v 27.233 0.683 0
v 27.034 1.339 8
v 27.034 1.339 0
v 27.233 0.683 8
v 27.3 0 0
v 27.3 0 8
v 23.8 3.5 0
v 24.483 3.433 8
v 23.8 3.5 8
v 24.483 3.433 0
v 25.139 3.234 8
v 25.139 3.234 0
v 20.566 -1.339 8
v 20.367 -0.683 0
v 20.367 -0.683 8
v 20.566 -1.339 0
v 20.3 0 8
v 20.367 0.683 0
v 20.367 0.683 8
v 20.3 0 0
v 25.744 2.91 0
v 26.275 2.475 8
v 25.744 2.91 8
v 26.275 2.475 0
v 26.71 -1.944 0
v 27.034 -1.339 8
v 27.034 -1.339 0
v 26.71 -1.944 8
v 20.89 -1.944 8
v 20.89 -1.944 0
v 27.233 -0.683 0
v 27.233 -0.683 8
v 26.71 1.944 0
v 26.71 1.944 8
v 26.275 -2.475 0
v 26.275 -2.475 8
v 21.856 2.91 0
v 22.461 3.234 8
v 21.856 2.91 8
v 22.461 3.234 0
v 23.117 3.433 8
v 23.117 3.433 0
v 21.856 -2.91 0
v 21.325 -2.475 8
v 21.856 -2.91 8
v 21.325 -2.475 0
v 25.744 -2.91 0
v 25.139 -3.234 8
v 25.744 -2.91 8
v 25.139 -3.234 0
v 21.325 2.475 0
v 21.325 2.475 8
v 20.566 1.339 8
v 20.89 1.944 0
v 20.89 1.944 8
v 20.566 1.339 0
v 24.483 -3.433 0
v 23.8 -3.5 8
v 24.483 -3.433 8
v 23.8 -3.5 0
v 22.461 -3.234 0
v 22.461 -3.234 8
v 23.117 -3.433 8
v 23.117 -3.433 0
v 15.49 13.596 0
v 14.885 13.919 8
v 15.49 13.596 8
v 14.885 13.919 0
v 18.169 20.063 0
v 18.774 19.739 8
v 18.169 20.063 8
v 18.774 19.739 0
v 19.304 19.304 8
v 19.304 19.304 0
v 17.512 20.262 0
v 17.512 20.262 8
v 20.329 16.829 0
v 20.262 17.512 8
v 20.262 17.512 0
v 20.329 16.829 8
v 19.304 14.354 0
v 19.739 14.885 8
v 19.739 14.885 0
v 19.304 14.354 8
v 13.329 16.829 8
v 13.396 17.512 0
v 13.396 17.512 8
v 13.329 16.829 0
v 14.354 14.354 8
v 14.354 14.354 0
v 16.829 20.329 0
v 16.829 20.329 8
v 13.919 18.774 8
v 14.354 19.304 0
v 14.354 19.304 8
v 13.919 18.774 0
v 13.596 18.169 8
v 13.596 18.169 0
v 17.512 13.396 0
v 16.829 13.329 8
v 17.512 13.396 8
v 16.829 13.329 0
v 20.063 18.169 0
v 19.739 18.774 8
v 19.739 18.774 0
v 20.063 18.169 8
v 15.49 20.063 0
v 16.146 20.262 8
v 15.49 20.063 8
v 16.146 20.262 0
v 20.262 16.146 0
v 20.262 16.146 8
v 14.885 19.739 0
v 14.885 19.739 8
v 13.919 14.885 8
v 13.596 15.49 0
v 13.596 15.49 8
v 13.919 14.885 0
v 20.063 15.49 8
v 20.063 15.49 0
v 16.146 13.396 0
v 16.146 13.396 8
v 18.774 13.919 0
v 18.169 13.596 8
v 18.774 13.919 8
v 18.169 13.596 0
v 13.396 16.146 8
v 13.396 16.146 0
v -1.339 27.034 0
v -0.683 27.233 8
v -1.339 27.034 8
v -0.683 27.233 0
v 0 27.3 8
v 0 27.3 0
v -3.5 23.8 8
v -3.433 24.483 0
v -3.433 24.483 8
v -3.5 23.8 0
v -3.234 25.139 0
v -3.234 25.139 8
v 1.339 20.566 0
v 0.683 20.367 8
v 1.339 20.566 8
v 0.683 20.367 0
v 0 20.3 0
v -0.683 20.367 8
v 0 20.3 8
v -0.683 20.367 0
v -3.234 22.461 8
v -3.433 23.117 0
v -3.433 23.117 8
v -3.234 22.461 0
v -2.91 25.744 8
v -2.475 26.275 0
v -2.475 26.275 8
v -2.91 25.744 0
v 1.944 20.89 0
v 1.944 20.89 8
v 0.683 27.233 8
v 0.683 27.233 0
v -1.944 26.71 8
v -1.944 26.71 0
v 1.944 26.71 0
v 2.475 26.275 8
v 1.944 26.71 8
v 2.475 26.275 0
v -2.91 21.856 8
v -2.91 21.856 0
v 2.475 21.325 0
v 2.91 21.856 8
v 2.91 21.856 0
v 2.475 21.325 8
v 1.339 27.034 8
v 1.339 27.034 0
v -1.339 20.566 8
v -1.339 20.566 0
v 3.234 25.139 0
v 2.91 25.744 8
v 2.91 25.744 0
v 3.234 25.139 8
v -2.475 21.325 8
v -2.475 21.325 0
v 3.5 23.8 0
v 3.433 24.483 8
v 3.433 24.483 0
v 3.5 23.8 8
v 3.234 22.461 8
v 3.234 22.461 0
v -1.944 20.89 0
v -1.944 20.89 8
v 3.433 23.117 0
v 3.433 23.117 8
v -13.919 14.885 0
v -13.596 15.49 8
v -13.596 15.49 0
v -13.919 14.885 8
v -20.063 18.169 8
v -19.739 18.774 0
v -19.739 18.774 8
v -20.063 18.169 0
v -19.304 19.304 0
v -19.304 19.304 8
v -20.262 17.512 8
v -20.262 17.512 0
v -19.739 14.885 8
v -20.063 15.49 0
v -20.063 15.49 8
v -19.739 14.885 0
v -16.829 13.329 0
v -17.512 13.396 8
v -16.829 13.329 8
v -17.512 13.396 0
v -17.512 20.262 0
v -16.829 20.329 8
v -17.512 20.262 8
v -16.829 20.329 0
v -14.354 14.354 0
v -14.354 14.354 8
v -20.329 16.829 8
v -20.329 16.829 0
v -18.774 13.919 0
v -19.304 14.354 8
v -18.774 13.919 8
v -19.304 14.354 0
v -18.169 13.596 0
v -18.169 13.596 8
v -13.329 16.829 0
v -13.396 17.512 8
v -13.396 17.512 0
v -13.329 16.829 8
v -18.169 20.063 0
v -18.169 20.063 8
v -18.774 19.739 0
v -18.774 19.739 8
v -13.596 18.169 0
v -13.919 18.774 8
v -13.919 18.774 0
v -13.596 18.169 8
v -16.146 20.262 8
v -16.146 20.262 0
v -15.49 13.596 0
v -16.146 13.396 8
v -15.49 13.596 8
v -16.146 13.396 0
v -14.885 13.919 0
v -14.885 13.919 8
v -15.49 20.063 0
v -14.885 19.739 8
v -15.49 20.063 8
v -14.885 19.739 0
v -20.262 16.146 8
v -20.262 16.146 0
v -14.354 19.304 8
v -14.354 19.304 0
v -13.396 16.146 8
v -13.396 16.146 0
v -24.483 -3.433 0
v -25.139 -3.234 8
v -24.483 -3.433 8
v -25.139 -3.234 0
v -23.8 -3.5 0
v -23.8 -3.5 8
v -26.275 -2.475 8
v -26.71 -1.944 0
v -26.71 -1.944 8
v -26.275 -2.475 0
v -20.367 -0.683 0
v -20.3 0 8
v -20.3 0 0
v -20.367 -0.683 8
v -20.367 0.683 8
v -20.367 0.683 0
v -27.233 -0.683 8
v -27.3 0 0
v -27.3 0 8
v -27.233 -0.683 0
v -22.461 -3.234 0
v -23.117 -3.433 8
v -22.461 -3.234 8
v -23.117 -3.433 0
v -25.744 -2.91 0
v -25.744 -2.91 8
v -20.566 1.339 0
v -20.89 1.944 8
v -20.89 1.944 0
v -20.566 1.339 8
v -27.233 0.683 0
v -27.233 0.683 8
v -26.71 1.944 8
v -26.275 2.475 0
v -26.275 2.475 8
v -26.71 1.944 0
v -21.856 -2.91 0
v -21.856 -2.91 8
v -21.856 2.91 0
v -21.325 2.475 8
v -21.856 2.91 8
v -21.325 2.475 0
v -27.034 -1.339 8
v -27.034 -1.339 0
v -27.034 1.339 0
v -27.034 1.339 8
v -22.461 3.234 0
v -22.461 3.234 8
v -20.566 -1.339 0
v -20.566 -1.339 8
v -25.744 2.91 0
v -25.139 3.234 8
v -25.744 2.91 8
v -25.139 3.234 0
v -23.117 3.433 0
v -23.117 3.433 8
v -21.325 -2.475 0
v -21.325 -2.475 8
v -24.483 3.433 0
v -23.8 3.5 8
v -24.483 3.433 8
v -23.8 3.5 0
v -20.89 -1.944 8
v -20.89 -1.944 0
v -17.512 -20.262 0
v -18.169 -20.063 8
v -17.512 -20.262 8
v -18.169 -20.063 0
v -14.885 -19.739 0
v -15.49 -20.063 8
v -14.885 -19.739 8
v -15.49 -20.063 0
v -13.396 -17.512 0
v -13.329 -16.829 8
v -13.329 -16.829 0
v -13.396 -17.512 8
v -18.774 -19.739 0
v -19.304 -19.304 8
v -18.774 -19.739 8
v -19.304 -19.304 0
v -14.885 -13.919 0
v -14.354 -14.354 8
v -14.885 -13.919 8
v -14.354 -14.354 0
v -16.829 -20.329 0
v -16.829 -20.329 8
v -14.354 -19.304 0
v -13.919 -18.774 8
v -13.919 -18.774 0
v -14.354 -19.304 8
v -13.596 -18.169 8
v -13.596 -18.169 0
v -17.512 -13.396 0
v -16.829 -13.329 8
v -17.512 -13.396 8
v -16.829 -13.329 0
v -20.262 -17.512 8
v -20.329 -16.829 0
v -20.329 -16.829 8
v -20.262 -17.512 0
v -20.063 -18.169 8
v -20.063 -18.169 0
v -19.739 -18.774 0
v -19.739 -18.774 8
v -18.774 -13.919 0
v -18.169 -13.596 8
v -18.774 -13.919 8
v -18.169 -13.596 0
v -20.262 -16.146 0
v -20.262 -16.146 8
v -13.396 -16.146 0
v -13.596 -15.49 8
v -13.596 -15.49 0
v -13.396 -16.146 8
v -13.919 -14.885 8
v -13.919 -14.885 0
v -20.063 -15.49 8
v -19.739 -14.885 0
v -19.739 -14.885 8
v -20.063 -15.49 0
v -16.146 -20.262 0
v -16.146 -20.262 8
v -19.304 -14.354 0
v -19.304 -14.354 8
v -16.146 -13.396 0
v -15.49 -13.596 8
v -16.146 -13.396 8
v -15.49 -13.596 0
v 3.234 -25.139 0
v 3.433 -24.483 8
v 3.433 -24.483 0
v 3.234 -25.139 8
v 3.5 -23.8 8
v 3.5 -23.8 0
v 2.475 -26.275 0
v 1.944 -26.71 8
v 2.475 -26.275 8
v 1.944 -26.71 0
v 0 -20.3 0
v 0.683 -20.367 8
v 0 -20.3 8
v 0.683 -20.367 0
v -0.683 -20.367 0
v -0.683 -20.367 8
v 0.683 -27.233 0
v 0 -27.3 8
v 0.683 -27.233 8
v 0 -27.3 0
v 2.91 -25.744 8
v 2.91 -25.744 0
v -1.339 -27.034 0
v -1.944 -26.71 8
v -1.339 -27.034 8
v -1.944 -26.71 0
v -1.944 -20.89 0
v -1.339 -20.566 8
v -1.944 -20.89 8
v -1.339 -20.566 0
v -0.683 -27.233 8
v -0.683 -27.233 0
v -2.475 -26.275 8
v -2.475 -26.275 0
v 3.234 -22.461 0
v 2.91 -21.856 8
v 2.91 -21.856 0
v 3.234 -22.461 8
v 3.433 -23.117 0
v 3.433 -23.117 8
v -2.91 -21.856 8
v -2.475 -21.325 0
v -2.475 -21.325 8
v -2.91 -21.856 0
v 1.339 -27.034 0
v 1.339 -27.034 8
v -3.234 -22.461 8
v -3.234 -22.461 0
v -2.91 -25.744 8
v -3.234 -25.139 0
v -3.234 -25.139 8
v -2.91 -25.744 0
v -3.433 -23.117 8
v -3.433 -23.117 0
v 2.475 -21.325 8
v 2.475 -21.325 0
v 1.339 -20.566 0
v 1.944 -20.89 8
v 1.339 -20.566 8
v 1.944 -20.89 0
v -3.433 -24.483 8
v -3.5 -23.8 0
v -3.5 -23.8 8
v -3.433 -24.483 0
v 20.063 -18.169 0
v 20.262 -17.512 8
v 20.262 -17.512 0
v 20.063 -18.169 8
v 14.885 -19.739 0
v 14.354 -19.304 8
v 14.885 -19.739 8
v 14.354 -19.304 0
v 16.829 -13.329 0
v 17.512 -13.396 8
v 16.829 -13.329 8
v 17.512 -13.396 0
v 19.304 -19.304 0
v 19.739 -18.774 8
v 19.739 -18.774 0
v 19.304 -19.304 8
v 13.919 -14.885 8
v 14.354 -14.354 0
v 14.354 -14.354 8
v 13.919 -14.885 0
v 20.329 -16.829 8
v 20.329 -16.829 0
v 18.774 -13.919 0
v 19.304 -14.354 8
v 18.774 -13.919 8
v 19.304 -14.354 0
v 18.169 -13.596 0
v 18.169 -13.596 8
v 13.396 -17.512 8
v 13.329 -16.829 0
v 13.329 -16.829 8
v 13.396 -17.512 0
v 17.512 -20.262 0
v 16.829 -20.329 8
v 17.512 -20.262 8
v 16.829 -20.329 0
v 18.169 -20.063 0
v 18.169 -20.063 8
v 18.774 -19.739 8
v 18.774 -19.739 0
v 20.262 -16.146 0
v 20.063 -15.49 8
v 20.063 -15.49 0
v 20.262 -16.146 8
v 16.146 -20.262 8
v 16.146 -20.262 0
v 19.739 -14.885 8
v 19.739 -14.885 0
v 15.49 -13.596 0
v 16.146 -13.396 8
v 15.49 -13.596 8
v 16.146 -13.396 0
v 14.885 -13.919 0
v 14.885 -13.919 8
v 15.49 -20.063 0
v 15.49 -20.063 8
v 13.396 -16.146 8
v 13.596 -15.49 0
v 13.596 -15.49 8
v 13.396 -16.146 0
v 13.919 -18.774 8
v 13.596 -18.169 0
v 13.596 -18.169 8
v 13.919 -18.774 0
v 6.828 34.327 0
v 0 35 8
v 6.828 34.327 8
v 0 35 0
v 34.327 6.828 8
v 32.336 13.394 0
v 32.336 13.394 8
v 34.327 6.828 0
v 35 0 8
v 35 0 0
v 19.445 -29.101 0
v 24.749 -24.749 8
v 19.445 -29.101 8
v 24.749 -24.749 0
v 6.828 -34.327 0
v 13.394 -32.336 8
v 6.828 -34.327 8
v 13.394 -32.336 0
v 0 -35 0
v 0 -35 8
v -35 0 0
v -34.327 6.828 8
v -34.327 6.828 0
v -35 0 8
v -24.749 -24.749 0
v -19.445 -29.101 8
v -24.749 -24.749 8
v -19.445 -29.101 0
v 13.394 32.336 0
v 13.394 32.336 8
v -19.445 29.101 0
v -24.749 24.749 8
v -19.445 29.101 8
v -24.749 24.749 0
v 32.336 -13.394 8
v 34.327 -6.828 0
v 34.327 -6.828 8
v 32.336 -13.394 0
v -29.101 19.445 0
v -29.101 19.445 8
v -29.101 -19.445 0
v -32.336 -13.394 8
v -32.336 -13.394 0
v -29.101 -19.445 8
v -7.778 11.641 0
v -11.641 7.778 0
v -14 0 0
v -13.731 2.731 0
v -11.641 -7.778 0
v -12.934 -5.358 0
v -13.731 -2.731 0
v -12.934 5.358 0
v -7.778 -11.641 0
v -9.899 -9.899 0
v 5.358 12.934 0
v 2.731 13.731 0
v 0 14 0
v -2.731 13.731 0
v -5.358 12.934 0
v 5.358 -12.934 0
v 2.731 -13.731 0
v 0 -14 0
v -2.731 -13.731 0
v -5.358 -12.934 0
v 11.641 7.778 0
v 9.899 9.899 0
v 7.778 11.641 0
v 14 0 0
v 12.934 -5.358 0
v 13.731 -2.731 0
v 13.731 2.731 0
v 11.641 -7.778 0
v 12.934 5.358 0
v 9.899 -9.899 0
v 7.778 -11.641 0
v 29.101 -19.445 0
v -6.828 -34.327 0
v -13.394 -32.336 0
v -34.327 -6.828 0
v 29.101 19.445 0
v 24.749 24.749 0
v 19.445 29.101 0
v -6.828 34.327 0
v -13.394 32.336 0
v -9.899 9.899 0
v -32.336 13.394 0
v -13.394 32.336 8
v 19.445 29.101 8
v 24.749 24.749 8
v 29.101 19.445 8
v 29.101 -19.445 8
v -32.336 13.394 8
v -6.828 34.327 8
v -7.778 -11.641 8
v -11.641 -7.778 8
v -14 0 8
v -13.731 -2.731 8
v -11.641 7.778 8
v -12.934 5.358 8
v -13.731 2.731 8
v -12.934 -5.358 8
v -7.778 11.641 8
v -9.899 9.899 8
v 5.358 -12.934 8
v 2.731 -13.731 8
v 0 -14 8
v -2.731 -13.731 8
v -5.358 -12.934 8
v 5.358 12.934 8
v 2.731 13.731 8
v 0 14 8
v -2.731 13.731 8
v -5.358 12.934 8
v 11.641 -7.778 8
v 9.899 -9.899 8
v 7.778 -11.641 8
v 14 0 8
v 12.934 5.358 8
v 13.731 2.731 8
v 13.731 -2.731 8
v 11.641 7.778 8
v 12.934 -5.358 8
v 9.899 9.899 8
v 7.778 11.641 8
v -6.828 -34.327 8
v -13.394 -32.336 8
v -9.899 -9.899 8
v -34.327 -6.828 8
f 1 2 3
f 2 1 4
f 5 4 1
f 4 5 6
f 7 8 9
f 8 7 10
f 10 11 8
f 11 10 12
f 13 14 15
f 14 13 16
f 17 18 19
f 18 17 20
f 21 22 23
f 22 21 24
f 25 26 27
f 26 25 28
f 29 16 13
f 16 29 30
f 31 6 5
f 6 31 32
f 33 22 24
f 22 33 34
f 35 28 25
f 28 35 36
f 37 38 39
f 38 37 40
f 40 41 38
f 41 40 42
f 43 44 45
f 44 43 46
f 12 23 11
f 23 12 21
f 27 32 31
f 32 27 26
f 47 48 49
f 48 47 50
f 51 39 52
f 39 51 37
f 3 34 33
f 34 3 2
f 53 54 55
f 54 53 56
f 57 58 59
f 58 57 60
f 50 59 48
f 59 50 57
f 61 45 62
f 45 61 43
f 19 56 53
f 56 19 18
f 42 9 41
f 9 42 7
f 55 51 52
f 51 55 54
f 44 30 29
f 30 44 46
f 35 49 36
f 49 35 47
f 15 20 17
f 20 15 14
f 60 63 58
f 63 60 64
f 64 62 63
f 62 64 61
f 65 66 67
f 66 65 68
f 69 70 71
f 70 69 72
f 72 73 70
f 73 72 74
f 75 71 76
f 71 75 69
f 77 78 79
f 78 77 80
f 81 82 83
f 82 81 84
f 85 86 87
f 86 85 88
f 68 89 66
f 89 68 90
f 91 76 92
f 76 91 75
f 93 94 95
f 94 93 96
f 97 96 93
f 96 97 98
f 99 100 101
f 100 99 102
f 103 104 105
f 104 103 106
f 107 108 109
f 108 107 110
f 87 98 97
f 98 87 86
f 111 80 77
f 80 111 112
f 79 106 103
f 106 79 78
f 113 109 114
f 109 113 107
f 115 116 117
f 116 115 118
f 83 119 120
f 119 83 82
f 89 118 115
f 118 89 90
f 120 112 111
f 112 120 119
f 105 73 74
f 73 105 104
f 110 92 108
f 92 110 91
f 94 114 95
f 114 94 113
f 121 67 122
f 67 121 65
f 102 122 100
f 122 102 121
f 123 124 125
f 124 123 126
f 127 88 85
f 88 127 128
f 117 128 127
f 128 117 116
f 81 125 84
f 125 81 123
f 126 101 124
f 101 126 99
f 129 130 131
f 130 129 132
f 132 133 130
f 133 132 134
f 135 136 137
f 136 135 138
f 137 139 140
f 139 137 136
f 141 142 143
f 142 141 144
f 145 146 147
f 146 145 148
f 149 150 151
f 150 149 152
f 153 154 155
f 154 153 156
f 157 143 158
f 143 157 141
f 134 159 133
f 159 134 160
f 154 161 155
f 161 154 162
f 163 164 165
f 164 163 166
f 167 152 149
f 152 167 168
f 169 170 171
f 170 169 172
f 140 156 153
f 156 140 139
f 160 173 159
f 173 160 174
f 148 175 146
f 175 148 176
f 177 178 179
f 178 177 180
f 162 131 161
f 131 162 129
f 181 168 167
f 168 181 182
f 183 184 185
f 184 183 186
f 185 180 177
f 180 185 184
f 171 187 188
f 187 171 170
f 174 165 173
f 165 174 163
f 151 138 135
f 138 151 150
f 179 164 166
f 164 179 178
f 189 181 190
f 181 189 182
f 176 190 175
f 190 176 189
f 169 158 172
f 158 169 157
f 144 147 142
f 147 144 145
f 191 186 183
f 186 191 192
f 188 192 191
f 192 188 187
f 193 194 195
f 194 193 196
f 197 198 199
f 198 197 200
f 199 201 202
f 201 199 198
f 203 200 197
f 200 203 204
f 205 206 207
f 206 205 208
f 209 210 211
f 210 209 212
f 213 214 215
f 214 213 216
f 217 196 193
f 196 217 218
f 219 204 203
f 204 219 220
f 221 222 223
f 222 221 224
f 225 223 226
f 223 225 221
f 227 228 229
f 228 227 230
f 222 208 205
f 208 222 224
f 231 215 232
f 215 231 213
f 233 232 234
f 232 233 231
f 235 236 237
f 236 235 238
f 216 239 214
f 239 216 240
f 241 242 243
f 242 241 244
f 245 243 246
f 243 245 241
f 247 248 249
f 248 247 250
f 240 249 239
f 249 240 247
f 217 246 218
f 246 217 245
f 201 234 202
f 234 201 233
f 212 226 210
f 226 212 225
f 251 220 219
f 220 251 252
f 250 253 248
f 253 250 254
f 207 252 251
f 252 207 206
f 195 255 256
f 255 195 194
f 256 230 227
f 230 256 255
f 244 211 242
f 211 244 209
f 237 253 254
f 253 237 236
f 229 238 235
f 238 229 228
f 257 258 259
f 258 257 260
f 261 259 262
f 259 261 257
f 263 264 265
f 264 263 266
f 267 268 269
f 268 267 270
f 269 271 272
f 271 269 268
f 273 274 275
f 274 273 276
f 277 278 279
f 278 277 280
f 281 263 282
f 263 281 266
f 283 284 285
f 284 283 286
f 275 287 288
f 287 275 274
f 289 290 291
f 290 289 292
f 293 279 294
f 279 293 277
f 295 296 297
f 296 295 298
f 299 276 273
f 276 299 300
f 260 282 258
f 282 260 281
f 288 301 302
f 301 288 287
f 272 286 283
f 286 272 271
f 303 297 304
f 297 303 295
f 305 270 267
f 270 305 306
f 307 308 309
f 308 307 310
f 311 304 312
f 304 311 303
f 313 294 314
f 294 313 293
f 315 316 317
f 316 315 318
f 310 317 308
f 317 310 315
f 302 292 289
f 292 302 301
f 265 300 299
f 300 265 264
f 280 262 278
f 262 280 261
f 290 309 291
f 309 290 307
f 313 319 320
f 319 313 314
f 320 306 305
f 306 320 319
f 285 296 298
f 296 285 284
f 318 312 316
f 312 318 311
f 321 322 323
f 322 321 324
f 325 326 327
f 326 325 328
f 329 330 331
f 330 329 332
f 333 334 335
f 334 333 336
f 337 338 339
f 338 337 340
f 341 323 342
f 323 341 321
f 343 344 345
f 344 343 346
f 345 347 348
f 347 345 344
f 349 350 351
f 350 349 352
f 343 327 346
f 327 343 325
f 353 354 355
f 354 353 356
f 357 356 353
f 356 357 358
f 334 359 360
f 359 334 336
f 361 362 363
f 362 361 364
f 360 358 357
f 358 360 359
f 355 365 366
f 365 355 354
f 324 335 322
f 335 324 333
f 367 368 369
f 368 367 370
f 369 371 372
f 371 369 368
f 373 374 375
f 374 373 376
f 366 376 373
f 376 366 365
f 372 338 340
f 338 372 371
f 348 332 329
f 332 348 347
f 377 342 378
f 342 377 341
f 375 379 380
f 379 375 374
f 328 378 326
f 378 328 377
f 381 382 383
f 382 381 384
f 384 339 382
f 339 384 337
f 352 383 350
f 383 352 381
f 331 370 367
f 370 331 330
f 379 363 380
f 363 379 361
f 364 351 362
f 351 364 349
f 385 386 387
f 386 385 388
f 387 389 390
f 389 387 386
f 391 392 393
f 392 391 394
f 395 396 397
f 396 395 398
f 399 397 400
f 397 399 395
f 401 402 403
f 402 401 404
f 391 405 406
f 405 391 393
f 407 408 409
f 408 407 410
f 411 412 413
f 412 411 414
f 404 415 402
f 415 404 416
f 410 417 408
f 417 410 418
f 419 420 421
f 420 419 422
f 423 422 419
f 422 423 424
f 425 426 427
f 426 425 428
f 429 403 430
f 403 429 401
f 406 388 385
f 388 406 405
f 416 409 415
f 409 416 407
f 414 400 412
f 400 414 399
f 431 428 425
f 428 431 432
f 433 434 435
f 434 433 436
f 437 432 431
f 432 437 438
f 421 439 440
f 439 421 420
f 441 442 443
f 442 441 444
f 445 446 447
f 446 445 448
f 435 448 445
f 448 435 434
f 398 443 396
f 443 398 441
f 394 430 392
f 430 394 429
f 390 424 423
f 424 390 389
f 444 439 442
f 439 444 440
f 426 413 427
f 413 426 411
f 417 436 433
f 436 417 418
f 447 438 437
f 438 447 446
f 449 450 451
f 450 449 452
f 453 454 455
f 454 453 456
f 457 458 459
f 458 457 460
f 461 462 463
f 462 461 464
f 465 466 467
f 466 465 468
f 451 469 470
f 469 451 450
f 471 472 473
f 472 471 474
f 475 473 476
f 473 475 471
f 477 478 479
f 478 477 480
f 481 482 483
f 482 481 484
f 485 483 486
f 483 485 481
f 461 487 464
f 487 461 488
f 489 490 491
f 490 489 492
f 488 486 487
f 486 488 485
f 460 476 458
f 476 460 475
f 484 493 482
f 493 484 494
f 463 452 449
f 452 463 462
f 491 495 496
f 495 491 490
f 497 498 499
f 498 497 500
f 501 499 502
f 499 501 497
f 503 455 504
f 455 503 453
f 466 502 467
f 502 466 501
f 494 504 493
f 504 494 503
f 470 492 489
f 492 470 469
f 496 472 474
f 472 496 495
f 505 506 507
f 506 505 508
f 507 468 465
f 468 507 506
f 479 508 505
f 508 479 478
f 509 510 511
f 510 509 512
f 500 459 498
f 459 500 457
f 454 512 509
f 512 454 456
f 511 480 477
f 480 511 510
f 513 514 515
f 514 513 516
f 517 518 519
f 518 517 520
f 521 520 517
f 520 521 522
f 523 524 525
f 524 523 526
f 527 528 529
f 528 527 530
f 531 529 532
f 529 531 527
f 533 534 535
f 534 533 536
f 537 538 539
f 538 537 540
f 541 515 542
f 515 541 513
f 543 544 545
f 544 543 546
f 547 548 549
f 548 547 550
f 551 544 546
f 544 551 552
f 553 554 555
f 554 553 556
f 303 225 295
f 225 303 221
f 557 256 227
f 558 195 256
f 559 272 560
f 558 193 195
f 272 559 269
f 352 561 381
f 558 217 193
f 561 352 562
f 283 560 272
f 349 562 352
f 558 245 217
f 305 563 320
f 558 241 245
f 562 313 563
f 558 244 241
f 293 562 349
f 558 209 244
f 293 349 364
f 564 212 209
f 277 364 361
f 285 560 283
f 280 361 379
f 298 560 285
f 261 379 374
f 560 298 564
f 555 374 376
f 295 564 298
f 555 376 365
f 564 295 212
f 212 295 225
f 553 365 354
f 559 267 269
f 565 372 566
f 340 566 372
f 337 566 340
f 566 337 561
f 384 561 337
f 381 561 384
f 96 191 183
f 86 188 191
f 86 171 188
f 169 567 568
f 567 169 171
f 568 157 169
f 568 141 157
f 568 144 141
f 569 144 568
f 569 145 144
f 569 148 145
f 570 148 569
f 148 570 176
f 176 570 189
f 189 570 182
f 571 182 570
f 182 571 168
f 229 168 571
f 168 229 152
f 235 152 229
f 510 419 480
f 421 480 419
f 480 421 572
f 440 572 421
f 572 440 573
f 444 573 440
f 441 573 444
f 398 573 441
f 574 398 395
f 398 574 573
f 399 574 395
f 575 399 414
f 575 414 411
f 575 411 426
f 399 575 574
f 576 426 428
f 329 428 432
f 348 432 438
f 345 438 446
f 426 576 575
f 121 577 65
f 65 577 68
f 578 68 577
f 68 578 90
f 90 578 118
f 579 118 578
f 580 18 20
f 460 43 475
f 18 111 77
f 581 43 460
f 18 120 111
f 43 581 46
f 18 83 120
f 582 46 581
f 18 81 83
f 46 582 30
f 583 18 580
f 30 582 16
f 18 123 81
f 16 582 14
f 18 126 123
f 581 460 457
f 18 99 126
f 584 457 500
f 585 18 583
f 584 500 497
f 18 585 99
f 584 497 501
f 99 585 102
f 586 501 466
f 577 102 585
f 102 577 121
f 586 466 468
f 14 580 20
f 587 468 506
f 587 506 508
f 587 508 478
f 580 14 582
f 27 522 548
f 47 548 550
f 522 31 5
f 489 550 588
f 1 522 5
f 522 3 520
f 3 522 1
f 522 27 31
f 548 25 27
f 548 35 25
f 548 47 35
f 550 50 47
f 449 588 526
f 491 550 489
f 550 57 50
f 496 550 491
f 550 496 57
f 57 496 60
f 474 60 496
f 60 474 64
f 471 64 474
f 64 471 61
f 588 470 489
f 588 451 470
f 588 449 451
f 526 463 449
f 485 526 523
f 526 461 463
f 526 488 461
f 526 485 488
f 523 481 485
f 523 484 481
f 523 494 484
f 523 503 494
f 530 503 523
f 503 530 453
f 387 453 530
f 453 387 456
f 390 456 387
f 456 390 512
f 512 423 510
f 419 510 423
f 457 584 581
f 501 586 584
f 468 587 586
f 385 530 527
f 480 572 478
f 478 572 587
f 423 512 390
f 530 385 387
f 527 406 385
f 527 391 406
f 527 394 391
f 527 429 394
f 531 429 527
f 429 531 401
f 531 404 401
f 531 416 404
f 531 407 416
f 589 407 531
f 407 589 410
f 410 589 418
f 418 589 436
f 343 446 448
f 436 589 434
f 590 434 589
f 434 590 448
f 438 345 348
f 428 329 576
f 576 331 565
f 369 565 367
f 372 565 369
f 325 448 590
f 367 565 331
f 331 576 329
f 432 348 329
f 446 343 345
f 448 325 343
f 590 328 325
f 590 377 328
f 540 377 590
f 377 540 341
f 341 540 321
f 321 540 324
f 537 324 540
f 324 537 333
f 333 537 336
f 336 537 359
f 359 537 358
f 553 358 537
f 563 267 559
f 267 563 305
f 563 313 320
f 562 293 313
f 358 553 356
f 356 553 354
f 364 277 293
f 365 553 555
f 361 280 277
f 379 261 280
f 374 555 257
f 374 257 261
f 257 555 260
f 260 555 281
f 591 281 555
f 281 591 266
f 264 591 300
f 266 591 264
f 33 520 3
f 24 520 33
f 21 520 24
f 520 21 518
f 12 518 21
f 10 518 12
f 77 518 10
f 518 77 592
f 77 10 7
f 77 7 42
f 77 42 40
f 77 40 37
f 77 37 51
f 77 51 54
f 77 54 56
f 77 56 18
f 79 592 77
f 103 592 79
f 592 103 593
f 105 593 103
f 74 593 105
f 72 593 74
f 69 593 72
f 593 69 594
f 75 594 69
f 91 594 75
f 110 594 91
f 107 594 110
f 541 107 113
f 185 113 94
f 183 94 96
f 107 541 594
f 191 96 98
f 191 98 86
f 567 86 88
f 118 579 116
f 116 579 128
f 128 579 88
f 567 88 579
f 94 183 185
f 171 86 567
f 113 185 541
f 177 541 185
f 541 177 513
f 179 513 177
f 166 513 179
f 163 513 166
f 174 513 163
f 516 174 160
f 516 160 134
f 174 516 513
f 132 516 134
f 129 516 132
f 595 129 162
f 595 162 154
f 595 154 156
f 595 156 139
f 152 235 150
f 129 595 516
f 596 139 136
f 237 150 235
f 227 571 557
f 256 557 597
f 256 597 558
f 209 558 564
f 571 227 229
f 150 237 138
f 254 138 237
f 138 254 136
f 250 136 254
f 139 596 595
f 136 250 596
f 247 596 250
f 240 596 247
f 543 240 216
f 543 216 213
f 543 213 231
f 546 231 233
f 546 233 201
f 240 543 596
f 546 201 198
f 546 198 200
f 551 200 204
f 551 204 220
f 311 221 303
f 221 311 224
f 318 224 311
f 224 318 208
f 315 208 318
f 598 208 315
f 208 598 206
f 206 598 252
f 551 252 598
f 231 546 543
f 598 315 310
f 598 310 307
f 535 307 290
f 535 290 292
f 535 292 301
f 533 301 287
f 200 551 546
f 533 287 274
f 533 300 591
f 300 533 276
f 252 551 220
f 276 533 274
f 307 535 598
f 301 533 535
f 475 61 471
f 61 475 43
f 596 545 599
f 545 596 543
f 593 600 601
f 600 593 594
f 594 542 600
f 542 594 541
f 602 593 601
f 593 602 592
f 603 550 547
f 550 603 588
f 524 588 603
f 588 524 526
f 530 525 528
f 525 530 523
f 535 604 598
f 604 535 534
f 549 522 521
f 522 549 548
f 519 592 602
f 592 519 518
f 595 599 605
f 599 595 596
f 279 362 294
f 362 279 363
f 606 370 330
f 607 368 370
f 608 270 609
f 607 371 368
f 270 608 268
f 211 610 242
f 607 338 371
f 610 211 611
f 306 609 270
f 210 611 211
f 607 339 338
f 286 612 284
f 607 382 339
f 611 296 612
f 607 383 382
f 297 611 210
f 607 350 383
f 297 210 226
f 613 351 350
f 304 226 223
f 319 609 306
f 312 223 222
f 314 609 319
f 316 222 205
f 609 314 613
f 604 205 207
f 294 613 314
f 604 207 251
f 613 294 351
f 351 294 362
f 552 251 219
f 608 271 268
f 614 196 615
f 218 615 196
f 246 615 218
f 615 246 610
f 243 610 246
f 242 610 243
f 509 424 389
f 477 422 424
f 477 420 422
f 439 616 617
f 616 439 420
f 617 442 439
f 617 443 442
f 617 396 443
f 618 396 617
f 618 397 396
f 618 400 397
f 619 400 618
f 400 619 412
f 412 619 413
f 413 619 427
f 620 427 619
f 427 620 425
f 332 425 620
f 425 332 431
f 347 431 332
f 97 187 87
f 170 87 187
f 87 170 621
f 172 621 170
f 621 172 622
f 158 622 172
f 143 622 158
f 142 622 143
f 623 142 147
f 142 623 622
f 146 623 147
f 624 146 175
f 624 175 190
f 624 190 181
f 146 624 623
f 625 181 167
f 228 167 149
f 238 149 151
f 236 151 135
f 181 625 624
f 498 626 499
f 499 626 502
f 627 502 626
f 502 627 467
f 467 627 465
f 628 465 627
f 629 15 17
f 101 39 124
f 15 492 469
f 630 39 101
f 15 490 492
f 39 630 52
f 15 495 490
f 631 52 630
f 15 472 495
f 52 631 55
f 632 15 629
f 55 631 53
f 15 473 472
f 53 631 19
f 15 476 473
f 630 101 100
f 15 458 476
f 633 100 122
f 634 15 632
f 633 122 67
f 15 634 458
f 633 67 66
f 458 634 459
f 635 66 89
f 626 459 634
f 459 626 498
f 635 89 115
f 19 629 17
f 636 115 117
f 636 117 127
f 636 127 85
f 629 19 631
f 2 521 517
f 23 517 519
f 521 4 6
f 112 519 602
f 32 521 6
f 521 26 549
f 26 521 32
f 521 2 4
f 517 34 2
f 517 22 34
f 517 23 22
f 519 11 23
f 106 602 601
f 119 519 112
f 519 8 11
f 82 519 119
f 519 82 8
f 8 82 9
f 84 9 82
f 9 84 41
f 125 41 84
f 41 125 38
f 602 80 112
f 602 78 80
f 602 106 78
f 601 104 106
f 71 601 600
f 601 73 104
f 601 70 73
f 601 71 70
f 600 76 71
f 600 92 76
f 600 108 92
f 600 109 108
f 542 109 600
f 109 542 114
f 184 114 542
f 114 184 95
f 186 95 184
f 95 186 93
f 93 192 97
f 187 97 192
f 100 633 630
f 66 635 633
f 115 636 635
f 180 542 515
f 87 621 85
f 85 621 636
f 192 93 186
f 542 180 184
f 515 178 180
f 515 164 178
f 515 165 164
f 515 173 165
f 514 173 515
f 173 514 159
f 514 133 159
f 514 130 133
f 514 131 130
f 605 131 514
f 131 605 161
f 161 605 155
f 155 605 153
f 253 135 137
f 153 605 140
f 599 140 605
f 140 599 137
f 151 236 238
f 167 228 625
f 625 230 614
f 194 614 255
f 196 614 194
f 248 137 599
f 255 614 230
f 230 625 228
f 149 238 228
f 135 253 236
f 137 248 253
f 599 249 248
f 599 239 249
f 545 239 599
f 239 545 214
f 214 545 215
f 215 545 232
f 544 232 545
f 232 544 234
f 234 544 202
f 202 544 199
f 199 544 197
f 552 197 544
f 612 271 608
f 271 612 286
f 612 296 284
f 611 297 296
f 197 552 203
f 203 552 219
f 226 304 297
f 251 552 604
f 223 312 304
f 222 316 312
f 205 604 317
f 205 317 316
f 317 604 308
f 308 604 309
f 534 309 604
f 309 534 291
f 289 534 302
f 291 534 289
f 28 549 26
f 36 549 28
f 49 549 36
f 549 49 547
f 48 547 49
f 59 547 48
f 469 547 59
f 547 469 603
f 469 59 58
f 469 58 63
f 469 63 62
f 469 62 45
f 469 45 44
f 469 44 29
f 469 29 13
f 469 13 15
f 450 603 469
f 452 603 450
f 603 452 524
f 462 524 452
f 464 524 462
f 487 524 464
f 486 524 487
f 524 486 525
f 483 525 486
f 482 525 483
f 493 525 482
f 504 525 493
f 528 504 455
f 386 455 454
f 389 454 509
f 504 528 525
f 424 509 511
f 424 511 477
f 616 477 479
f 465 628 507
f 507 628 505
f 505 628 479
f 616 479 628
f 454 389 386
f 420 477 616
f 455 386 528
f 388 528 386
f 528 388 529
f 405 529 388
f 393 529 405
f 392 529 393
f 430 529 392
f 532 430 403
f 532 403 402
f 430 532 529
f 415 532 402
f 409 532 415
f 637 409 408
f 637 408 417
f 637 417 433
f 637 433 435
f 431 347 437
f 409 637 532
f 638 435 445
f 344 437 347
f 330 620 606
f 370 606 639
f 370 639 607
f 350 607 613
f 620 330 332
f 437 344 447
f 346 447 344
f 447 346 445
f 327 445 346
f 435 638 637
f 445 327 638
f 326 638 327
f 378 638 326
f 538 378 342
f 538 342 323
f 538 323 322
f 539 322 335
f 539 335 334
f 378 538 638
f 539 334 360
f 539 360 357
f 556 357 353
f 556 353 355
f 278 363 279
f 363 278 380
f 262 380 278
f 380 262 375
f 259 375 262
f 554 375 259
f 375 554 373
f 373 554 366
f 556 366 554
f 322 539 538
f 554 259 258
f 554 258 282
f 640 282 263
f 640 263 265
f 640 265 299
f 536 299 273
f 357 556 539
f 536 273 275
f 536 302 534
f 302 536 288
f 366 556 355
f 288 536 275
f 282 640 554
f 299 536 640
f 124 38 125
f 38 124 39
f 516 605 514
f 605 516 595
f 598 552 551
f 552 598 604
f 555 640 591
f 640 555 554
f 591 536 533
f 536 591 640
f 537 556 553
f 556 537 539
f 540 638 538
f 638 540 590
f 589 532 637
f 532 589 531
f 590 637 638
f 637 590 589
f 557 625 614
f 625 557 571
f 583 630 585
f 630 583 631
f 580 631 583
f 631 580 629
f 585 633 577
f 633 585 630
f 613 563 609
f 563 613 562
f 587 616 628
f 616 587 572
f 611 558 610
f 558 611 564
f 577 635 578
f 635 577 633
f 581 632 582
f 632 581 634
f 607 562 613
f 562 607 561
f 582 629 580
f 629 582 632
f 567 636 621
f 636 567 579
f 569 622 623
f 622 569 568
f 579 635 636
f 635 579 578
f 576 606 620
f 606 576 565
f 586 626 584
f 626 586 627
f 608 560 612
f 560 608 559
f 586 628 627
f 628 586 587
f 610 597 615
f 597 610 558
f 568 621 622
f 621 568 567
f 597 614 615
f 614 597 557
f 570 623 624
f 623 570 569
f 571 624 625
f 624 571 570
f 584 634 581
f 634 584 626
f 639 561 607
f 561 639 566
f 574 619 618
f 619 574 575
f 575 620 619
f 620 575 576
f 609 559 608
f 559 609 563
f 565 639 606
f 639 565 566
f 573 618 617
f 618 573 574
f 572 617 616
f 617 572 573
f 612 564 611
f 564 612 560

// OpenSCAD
$fn = 32;

// ----------------------------------------------------------------------
// Bolt-circle flange: 70 mm outside, 8 bolt holes, bore 28 mm
// ----------------------------------------------------------------------

// --- parameters (mm) ---
flange_d = 70;            // flange outside diameter
flange_t = 8;             // flange thickness
bolts = 8;                // number of bolt holes
bolt_d = 7;               // bolt clearance
bolt_r = 23.8;            // bolt circle radius
bore_d = 28;              // centre bore

module body() {
  cylinder(h = flange_t, d = flange_d);
}

difference() {
  body();
  /* bolt circle */
  for (i = [0 : bolts - 1]) rotate([0, 0, i * 360 / bolts]) translate([bolt_r, 0, -1]) cylinder(h = flange_t + 3, d = bolt_d);
  translate([0, 0, -1]) cylinder(h = flange_t + 3, d = bore_d);
}
